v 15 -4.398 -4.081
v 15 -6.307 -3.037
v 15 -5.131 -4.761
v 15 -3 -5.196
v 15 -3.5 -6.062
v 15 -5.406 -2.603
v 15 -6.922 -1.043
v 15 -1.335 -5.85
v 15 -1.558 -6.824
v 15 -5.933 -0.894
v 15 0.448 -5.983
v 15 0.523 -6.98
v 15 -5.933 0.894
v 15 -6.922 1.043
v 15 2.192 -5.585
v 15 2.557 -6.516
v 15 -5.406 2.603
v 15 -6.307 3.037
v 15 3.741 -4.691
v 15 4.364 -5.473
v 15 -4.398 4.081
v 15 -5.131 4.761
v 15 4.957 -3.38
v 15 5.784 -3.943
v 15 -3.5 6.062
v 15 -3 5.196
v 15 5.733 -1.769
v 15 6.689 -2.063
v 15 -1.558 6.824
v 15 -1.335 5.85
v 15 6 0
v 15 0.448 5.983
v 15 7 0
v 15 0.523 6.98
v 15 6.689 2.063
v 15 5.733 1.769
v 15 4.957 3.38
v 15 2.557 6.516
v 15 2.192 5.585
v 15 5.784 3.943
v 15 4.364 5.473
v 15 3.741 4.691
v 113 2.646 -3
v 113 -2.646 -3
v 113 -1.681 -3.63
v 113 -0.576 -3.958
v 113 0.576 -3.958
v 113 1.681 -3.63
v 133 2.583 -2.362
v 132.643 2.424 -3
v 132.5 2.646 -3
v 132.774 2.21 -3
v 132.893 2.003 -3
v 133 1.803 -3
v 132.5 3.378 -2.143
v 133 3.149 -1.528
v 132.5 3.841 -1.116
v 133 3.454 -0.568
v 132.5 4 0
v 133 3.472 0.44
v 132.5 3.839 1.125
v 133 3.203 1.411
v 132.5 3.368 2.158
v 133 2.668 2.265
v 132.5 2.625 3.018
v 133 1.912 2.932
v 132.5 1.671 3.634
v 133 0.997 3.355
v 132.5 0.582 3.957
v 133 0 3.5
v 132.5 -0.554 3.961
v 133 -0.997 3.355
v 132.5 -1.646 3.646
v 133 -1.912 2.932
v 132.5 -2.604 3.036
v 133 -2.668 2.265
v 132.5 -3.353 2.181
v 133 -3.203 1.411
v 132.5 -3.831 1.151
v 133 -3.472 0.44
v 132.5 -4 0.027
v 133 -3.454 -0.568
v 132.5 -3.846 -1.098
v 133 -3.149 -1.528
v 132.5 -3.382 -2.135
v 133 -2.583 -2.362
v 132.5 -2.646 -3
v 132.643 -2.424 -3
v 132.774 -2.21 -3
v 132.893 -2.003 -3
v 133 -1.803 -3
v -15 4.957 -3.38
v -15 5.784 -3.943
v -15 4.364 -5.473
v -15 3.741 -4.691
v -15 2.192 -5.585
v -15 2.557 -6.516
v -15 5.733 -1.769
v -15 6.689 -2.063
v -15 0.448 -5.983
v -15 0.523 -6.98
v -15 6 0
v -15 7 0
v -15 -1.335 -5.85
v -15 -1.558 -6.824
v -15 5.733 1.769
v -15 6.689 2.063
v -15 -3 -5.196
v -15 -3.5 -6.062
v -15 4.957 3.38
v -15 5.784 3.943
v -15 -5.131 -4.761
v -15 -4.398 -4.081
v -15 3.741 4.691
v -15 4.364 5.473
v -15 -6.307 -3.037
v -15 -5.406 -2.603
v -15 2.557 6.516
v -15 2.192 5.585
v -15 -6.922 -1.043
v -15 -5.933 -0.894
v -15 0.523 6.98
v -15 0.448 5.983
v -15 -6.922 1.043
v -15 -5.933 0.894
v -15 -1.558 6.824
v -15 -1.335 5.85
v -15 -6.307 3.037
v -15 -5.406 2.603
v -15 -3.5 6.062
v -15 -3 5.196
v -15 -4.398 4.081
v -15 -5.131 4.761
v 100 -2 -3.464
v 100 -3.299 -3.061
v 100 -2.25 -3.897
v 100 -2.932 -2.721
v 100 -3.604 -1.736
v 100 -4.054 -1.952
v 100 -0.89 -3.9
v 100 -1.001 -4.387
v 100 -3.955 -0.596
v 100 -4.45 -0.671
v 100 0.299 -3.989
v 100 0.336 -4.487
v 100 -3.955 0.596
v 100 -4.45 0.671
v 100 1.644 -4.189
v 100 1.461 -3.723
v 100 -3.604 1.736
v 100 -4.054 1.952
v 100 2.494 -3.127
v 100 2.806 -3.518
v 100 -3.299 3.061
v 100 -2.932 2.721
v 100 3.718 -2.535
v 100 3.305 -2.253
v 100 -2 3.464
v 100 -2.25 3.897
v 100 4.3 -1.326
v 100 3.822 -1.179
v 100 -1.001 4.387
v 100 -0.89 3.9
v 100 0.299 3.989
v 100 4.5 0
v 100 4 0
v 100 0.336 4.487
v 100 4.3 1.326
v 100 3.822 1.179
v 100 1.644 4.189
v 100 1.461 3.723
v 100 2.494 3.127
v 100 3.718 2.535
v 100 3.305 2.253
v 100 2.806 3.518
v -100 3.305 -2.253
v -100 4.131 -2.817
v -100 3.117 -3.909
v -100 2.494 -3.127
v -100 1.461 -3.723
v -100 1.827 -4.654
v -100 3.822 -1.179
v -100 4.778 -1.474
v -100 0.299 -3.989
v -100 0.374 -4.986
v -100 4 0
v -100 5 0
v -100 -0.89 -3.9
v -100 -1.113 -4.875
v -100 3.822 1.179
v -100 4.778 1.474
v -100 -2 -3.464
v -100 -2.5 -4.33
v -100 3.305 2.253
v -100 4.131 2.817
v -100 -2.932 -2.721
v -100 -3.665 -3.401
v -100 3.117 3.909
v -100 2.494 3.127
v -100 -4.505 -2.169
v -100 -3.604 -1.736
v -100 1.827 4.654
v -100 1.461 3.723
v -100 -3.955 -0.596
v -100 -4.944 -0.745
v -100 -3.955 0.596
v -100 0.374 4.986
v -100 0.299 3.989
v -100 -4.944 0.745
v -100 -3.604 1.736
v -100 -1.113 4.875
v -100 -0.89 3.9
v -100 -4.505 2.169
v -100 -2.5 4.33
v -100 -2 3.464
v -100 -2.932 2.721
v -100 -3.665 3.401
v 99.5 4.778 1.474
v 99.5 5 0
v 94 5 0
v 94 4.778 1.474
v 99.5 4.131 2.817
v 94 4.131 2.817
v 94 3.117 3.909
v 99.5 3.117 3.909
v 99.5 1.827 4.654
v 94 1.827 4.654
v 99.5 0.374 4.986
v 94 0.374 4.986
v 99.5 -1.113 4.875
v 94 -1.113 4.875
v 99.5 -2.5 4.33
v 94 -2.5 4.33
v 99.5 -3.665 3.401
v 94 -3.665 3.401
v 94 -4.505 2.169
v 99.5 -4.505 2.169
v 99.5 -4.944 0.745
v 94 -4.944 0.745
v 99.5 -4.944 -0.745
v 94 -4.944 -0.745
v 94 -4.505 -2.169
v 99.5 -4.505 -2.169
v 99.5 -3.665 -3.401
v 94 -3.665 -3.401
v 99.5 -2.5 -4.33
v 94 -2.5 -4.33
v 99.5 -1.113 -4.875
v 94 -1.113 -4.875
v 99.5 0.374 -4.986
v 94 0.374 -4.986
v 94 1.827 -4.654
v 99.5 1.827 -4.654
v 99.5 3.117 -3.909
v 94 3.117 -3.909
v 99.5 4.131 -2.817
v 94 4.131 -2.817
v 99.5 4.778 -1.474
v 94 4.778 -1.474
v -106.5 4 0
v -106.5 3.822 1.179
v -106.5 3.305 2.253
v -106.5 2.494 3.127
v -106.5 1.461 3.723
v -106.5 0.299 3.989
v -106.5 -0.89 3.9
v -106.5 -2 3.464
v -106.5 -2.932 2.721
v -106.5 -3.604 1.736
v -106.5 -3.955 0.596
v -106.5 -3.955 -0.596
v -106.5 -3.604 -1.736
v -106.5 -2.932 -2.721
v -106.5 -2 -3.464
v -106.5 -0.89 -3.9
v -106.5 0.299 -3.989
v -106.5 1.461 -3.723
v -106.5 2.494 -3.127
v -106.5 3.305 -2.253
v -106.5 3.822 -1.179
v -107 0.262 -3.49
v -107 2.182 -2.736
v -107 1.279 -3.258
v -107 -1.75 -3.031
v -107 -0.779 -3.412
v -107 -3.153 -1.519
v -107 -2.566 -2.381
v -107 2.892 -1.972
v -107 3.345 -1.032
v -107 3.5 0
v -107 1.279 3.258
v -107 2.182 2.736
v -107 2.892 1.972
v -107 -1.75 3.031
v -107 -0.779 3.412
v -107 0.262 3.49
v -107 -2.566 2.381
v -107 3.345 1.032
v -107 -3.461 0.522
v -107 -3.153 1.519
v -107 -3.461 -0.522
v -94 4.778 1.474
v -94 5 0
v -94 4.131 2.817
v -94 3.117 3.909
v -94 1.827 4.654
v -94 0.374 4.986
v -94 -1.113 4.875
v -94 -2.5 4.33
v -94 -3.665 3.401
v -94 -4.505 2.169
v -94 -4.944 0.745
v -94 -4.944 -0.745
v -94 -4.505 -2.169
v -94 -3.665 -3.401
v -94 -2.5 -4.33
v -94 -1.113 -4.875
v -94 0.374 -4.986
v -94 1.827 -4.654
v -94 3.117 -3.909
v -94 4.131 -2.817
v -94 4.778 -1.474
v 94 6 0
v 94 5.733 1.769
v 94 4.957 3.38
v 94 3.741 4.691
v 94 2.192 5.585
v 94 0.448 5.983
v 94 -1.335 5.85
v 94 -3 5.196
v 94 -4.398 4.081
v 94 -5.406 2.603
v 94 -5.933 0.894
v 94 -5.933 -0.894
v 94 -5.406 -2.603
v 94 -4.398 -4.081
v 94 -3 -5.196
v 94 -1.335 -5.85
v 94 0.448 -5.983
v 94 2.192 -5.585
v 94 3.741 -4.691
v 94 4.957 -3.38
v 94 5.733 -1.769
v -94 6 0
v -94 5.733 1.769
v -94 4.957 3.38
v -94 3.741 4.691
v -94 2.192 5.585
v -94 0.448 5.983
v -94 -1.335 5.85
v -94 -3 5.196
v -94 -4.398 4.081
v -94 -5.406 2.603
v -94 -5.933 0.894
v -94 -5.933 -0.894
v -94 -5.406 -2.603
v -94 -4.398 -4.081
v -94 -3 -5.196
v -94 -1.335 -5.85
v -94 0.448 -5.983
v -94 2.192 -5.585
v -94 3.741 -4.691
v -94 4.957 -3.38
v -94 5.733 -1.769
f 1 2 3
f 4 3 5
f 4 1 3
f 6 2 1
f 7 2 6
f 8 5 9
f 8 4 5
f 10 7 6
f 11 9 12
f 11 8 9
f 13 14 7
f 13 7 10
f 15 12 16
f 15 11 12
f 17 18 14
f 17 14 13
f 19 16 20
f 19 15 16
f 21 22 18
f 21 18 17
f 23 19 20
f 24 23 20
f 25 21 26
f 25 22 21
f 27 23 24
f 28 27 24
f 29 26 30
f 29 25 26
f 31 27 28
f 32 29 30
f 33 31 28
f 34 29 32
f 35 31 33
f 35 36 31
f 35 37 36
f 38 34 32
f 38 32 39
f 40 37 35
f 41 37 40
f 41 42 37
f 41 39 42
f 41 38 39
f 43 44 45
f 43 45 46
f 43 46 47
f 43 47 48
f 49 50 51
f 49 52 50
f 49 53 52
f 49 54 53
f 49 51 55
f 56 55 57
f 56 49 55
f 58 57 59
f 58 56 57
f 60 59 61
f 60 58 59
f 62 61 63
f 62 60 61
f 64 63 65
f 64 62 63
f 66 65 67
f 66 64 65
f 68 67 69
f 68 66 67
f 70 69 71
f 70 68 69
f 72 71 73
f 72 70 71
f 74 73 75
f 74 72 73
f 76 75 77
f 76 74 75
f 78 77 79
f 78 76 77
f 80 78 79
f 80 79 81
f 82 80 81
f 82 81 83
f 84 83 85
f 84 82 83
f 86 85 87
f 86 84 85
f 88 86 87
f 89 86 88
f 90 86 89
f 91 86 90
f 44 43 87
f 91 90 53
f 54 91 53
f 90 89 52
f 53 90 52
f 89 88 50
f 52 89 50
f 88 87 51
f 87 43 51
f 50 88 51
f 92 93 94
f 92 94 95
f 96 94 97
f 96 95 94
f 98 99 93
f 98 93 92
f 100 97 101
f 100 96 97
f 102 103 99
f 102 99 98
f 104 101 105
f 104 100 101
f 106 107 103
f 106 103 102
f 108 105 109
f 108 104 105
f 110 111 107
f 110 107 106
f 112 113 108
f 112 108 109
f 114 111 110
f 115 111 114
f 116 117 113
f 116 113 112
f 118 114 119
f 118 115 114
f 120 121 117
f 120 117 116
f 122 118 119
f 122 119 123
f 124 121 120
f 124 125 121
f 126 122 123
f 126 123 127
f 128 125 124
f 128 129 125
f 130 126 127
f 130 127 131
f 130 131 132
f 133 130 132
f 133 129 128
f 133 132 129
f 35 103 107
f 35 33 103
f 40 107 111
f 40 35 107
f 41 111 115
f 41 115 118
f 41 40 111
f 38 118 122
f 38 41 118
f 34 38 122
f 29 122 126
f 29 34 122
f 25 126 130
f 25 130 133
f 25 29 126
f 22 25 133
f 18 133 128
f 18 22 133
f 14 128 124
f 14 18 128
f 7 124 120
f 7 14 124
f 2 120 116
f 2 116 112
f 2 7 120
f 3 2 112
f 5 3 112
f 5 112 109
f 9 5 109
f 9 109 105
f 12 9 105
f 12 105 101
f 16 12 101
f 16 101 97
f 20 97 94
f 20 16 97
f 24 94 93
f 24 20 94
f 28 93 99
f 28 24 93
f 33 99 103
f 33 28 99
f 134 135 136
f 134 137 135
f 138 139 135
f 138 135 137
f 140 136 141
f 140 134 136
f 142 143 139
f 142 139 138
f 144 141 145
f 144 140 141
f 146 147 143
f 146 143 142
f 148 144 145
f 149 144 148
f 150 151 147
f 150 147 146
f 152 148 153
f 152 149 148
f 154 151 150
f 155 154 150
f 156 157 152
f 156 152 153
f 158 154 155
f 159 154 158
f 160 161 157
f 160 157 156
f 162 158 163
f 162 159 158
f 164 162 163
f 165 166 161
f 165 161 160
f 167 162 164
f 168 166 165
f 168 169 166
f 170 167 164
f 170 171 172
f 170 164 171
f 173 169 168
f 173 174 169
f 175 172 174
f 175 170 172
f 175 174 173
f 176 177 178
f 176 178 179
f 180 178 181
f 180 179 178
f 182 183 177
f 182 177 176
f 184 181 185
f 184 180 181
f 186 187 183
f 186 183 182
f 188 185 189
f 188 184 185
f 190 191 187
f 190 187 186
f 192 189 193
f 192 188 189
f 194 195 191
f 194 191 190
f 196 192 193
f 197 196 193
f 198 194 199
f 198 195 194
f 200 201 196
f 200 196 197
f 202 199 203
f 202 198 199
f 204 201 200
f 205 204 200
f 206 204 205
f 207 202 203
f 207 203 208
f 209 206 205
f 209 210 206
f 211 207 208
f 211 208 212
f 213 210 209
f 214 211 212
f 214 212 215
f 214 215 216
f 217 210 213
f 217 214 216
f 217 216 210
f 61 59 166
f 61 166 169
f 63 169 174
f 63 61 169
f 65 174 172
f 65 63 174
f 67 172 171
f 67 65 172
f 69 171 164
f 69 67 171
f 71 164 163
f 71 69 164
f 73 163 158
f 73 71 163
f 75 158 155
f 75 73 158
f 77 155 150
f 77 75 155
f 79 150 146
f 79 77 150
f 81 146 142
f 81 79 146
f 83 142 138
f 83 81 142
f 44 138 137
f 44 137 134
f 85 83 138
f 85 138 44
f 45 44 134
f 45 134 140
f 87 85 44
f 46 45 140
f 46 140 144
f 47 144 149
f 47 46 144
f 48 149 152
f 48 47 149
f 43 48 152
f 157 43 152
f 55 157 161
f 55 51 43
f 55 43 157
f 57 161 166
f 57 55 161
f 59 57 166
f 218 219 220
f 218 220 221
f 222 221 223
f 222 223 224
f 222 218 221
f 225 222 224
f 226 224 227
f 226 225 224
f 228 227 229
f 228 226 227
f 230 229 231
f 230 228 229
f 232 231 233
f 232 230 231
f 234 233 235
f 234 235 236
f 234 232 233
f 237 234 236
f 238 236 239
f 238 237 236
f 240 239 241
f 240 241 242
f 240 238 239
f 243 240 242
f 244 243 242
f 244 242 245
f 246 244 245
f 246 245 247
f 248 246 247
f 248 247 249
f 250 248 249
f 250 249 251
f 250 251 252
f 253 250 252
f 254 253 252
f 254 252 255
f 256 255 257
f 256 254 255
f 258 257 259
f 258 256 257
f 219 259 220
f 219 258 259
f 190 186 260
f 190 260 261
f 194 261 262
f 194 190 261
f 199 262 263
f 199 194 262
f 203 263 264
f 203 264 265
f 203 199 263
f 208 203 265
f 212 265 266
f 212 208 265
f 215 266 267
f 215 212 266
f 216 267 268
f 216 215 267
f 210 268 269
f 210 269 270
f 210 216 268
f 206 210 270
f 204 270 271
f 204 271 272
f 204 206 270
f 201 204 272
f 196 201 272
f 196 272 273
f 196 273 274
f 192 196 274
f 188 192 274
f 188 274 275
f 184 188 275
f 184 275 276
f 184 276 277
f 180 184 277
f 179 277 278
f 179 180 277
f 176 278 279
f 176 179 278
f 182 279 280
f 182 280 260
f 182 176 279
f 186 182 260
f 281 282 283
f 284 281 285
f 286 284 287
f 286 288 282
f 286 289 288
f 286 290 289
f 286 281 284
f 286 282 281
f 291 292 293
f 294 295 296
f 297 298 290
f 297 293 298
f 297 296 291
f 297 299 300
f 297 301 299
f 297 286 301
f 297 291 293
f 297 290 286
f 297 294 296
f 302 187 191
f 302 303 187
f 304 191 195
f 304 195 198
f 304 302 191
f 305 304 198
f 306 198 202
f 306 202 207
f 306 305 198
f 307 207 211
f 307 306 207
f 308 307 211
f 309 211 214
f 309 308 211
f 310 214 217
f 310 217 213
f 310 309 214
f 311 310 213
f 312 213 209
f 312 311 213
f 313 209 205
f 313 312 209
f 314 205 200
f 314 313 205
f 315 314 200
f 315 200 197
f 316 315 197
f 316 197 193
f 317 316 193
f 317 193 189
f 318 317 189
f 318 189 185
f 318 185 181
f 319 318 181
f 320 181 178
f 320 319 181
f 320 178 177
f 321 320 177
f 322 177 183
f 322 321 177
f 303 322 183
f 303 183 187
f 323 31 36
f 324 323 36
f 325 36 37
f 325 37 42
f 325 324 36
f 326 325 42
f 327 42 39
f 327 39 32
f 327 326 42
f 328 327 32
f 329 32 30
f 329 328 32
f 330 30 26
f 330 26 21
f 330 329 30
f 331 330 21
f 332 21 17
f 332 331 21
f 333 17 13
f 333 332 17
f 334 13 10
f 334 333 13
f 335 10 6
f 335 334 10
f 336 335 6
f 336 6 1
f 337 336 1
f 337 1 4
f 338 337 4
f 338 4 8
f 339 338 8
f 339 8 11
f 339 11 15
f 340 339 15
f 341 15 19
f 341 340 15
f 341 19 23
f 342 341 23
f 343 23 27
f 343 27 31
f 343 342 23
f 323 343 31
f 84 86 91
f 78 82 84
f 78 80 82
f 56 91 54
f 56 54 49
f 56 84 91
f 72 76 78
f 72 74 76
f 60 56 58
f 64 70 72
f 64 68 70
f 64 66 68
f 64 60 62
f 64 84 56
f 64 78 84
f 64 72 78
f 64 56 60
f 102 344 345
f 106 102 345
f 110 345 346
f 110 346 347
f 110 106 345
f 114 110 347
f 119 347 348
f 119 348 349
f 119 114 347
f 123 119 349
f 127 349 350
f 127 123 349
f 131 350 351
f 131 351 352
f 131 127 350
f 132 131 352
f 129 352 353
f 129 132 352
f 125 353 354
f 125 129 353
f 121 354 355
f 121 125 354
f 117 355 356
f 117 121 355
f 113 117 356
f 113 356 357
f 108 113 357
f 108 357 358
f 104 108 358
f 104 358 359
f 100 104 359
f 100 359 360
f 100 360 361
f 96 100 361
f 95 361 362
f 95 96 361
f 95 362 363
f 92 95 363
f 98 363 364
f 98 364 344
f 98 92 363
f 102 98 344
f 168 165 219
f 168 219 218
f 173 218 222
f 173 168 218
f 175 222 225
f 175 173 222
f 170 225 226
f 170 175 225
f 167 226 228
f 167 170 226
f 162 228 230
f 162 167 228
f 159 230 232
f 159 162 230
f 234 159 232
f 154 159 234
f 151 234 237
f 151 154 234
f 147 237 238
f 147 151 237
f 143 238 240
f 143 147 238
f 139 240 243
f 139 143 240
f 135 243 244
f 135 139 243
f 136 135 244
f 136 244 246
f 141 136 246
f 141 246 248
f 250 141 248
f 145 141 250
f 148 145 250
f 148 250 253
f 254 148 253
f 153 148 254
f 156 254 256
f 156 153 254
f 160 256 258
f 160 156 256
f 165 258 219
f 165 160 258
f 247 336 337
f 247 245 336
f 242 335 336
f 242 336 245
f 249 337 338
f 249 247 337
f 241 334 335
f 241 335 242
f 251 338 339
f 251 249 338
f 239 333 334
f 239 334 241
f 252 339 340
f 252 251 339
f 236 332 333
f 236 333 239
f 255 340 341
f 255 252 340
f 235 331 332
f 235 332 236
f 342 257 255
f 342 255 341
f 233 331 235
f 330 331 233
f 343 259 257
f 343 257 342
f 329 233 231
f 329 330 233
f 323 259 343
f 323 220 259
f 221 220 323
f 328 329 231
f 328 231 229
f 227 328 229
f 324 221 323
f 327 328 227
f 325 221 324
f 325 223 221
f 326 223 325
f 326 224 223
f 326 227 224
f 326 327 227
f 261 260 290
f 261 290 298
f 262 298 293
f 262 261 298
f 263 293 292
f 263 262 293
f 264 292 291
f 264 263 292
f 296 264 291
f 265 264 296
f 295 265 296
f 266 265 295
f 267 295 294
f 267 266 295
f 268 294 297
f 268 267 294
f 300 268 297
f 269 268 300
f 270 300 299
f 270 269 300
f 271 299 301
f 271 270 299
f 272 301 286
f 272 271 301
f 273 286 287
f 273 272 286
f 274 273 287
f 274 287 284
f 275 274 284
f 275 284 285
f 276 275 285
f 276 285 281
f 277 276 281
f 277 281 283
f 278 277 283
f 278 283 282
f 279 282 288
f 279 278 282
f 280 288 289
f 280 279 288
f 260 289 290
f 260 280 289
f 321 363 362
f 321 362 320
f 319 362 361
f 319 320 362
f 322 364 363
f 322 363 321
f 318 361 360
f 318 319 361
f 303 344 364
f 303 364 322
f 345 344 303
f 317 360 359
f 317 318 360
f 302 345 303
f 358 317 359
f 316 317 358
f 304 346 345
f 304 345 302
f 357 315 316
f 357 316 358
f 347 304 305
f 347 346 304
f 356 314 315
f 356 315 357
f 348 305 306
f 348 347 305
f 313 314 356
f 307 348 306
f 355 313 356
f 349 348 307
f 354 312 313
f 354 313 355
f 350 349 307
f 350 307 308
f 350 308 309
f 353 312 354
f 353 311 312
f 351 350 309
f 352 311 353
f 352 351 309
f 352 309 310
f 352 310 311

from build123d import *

# Parameters (mm, degrees)
SKETCH_2_W          = 25.545670962
SKETCH_2_H          = 18.659121507
CUT_EXTRUDE_1_DEPTH = 10
CHAMFER_1_SIZE      = 0.5


with BuildPart() as part:
    # 草图1 → 旋转1 (revolve)
    with BuildSketch(Plane.XY):
        Polygon((-107, 0), (-107, 4), (-100, 4), (-100, 5), (-94, 5), (-94, 6), (-15, 6), (-15, 7), (15, 7), (15, 6), (94, 6), (94, 5), (100, 5), (100, 4), (133, 4), (133, 0), align=None)
    revolve(axis=Axis((-107, 0, 0), (1, 0, 0)))

    # 草图2 → 切除-拉伸1 (cut)
    with BuildSketch(Plane.XY.offset(-3)):
        with Locations((125.772835481, -0.110098382)):
            Rectangle(SKETCH_2_W, SKETCH_2_H)
    extrude(amount=-CUT_EXTRUDE_1_DEPTH, mode=Mode.SUBTRACT)

    # 倒角1
    chamfer_1_edges = [part.edges().sort_by_distance(p)[0] for p in [
        (100, -5, 0),
        (-107, -4, 0),
        (133, -1.645751311, 3.645751311),
    ]]
    chamfer(chamfer_1_edges, length=CHAMFER_1_SIZE)


solid = part.part
